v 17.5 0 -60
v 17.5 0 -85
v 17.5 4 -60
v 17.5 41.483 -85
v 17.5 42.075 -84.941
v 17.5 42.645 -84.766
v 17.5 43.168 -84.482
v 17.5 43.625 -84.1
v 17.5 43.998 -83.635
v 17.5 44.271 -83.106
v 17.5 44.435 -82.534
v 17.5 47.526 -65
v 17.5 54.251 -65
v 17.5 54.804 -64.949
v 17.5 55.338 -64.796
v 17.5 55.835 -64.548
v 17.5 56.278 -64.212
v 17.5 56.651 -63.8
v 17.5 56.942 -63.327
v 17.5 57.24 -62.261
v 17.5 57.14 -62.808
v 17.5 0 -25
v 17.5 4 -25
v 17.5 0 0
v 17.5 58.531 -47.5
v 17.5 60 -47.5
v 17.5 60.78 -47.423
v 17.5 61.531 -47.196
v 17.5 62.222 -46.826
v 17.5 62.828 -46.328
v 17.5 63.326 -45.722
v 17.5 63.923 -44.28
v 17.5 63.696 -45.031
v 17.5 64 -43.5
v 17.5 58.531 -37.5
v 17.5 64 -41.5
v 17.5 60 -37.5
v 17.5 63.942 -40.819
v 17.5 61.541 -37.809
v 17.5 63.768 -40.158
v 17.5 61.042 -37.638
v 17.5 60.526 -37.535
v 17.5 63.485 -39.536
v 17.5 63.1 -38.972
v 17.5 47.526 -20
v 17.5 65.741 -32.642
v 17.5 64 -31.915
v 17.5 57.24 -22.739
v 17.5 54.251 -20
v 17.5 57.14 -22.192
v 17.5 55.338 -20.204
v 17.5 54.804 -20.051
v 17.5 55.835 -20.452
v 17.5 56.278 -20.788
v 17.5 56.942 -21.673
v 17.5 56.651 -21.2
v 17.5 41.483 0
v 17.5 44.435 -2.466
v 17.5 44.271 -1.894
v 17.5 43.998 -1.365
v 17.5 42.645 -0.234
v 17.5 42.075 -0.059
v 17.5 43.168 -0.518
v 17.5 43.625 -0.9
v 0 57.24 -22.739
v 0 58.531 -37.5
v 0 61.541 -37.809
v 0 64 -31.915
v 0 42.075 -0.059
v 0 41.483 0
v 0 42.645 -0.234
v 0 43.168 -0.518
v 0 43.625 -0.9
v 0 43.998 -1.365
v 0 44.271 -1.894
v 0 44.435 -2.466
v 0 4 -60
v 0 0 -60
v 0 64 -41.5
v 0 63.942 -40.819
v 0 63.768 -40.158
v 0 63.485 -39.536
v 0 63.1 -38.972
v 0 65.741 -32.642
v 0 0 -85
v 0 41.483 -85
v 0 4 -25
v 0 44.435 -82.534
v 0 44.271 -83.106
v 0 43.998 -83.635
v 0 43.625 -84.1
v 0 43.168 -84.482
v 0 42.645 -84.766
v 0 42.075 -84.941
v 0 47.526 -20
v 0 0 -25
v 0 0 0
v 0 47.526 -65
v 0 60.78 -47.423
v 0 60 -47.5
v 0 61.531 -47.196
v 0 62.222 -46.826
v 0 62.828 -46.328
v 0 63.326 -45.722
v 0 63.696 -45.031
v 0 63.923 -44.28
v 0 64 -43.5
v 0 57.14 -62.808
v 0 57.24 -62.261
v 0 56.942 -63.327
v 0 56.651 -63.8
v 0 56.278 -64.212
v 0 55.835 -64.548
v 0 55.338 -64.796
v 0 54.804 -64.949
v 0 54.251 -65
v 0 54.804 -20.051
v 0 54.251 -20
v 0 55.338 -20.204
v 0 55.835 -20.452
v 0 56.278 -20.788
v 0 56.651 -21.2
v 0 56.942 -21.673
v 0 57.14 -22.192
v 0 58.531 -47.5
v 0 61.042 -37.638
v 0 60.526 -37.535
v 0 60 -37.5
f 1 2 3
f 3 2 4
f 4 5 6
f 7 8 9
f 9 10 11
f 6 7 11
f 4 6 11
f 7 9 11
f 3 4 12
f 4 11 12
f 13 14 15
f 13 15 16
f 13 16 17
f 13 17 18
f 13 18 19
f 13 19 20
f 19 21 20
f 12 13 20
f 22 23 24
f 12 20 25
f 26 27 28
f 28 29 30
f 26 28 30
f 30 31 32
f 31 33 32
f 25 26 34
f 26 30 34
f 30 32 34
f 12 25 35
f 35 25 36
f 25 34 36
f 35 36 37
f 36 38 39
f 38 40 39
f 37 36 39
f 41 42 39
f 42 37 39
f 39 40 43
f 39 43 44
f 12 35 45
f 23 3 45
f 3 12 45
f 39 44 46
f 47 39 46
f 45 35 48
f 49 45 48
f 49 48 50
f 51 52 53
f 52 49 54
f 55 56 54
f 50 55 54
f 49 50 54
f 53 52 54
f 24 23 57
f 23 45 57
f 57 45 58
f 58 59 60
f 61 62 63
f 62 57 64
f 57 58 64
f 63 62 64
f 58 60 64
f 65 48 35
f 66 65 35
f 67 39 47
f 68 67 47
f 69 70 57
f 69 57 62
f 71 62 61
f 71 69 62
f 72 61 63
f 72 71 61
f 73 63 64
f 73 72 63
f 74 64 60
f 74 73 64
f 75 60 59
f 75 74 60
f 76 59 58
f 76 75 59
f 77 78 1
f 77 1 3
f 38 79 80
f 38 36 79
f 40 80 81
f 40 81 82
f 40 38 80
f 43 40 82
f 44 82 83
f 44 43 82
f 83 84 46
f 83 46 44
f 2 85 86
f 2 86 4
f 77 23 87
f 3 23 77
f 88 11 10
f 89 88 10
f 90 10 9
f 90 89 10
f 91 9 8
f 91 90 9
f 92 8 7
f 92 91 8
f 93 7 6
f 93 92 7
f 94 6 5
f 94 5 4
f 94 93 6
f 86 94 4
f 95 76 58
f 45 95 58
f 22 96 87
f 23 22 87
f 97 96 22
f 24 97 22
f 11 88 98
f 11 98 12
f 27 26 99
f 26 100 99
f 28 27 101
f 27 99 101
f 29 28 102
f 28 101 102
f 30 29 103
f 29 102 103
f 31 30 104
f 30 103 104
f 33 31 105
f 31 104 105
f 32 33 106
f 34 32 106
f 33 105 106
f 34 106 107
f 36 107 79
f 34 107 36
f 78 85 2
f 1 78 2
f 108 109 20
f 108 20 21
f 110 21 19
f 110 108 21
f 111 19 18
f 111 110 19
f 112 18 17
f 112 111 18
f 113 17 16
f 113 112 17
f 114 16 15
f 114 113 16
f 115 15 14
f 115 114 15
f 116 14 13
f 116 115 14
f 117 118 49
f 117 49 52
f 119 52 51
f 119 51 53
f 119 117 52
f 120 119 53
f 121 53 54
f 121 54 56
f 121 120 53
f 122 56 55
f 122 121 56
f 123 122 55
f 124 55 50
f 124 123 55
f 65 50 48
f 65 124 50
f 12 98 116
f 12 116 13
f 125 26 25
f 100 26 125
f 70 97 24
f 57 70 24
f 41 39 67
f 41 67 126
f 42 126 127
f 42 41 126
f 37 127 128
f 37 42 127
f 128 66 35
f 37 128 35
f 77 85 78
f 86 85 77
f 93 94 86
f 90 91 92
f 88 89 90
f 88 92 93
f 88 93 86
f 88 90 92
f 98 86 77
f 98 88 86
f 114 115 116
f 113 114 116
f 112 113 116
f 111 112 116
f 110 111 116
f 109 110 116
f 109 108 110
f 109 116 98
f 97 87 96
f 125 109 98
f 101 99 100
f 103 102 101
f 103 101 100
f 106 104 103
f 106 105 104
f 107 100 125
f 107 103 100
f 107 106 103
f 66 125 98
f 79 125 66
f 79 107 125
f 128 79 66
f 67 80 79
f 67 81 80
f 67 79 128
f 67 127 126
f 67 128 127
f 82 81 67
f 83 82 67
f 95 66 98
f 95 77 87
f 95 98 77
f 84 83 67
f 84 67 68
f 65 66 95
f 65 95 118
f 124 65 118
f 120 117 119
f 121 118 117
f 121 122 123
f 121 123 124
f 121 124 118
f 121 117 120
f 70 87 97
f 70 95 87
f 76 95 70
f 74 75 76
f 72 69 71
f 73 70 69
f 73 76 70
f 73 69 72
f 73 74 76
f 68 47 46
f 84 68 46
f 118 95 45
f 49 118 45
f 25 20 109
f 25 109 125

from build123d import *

# Parameters (mm, degrees)
SKETCH_1_W          = 17.5
SKETCH_1_H          = 85
EXTRUDE_1_DEPTH     = 44
SKETCH_2_W          = 17.5
SKETCH_2_H          = 45
EXTRUDE_2_DEPTH     = 15
EXTRUDE_3_DEPTH     = 5
CHAMFER_1_SIZE2     = 3.526539614
CHAMFER_1_SIZE      = 20
CHAMFER_2_SIZE2     = 3.526539614
CHAMFER_2_SIZE      = 20
CHAMFER_3_SIZE      = 2
CHAMFER_3_SIZE_2    = 22.860104606
CHAMFER_4_SIZE      = 2
CHAMFER_4_SIZE_2    = 22.860104606
FILLET_START        = -1
FILLET_1_DEPTH      = 19
FILLET_2_R          = 4
EXTRUDE_5_DEPTH     = 17.5
CUT_EXTRUDE_1_REACH = 110.872
SKETCH_6_W          = 35
SKETCH_6_H          = 4


with BuildPart() as part:
    # Эскиз1 → Бобышка-Вытянуть1 (new body)
    with BuildSketch(Plane(origin=(0, 0, 0), x_dir=(1, 0, 0), z_dir=(0, 1, 0))):
        with Locations((8.75, 42.5)):
            Rectangle(SKETCH_1_W, SKETCH_1_H)
    extrude(amount=EXTRUDE_1_DEPTH)

    # Эскиз2 → Бобышка-Вытянуть2 (add)
    with BuildSketch(Plane(origin=(0, 44, 0), x_dir=(1, 0, 0), z_dir=(0, 1, 0))):
        with Locations((8.75, 42.5)):
            Rectangle(SKETCH_2_W, SKETCH_2_H)
    extrude(amount=EXTRUDE_2_DEPTH)

    # Эскиз3 → Бобышка-Вытянуть3 (add)
    with BuildSketch(Plane(origin=(0, 59, 0), x_dir=(1, 0, 0), z_dir=(0, 1, 0))):
        Polygon((17.5, 42.5), (17.5, 47.5), (0, 47.5), (0, 42.5), (0, 37.5), (17.5, 37.5), align=None)
    extrude(amount=EXTRUDE_3_DEPTH)

    # Фаска1
    chamfer_1_edges = [part.edges().sort_by_distance(p)[0] for p in [
        (8.75, 44, -65),
    ]]
    chamfer_1_side = [part.faces().sort_by_distance(p)[0] for p in [
        (8.75, 44, -65.070530792),
    ]]
    chamfer(chamfer_1_edges, length=CHAMFER_1_SIZE - 0.0001, length2=CHAMFER_1_SIZE2 - 0.0001, reference=chamfer_1_side[0])  # a hair under: the kernel refuses the full size

    # Фаска2
    chamfer_2_edges = [part.edges().sort_by_distance(p)[0] for p in [
        (8.75, 44, -20),
    ]]
    chamfer_2_side = [part.faces().sort_by_distance(p)[0] for p in [
        (8.75, 44, -19.929469208),
    ]]
    chamfer(chamfer_2_edges, length=CHAMFER_2_SIZE - 0.0001, length2=CHAMFER_2_SIZE2 - 0.0001, reference=chamfer_2_side[0])  # a hair under: the kernel refuses the full size

    # Фаска3
    # the kernel refuses this chamfer: 22.860104606, 2 mm, written as the material it takes off along each edge
    with BuildSketch(Plane(origin=(-59.427907001, 59, -65), x_dir=(0, -1, 0), z_dir=(1, 0, 0))) as chamfer_3_piece_1_section:
        Polygon((CHAMFER_3_SIZE, 0), (0, -CHAMFER_3_SIZE_2), (0, 0), align=None)
    chamfer_3_piece_1 = extrude(amount=136.355814002, mode=Mode.PRIVATE)
    chamfer_3_piece_1 = split(chamfer_3_piece_1, bisect_by=Plane(origin=(-59.427907001, 59, -47.5), z_dir=(0, 0, -1)), keep=Keep.TOP, mode=Mode.PRIVATE)
    add(chamfer_3_piece_1, mode=Mode.SUBTRACT)

    # Фаска4
    # the kernel refuses this chamfer: 22.860104606, 2 mm, written as the material it takes off along each edge
    with BuildSketch(Plane(origin=(76.927907001, 59, -20), x_dir=(0, -1, 0), z_dir=(-1, 0, 0))) as chamfer_4_piece_1_section:
        Polygon((CHAMFER_4_SIZE, 0), (0, -CHAMFER_4_SIZE_2), (0, 0), align=None)
    chamfer_4_piece_1 = extrude(amount=136.355814002, mode=Mode.PRIVATE)
    chamfer_4_piece_1 = split(chamfer_4_piece_1, bisect_by=Plane(origin=(76.927907001, 59, -37.5), z_dir=(0, 0, 1)), keep=Keep.TOP, mode=Mode.PRIVATE)
    add(chamfer_4_piece_1, mode=Mode.SUBTRACT)

    # Скругление1: read off the stored shape, not the designer's step
    # Скругление1 outline → Скругление1 (cut)
    with BuildSketch(Plane.YZ.offset(FILLET_START)):
        with BuildLine():
            Line((44, 0), (41.482701106, 0))
            ThreePointArc((41.482701106, 0), (43.411063935, -0.701866671), (44.437124366, -2.479055467))
            Line((44.437124366, -2.479055467), (44, 0))
        make_face()
        with BuildLine():
            Line((57, -20), (54.251006478, -20))
            ThreePointArc((54.251006478, -20), (56.277777101, -20.78816799), (57.239590572, -22.738532772))
            Line((57.239590572, -22.738532772), (57, -20))
        make_face()
        with BuildLine():
            Line((57, -65), (57.239590572, -62.261467228))
            ThreePointArc((57.239590572, -62.261467228), (56.277777101, -64.21183201), (54.251006478, -65))
            Line((54.251006478, -65), (57, -65))
        make_face()
        with BuildLine():
            Line((44, -85), (44.437124366, -82.520944533))
            ThreePointArc((44.437124366, -82.520944533), (43.411063935, -84.298133329), (41.482701106, -85))
            Line((41.482701106, -85), (44, -85))
        make_face()
    extrude(amount=FILLET_1_DEPTH, mode=Mode.SUBTRACT)

    # Скругление2
    fillet_2_edges = [part.edges().sort_by_distance(p)[0] for p in [
        (8.75, 64, -47.5),
        (8.75, 64, -37.5),
    ]]
    fillet(fillet_2_edges, radius=FILLET_2_R)

    # Эскиз5 → Бобышка-Вытянуть5 (add)
    with BuildSketch(Plane.ZY):
        Polygon((-37.808562445, 61.540548206), (-31.915262461, 64), (-32.641917341, 65.741199076), (-39.550806856, 62.857911145), (-38.824151977, 61.11671207), align=None)
    extrude(amount=-EXTRUDE_5_DEPTH)

    # Эскиз6 → Вырез-Вытянуть1 (cut, up to next)
    with BuildSketch(Plane(origin=(17.5, 0, 0), x_dir=(0, 0, -1), z_dir=(1, 0, 0)), mode=Mode.PRIVATE) as cut_extrude_1_sk1:
        with Locations((42.5, 2)):
            Rectangle(SKETCH_6_W, SKETCH_6_H)
    cut_extrude_1_tool1 = extrude(cut_extrude_1_sk1.sketch, amount=-CUT_EXTRUDE_1_REACH, mode=Mode.PRIVATE) & part.part
    add(cut_extrude_1_tool1.solids().sort_by_distance((17.5, 2, -42.5))[0], mode=Mode.SUBTRACT)


solid = part.part
